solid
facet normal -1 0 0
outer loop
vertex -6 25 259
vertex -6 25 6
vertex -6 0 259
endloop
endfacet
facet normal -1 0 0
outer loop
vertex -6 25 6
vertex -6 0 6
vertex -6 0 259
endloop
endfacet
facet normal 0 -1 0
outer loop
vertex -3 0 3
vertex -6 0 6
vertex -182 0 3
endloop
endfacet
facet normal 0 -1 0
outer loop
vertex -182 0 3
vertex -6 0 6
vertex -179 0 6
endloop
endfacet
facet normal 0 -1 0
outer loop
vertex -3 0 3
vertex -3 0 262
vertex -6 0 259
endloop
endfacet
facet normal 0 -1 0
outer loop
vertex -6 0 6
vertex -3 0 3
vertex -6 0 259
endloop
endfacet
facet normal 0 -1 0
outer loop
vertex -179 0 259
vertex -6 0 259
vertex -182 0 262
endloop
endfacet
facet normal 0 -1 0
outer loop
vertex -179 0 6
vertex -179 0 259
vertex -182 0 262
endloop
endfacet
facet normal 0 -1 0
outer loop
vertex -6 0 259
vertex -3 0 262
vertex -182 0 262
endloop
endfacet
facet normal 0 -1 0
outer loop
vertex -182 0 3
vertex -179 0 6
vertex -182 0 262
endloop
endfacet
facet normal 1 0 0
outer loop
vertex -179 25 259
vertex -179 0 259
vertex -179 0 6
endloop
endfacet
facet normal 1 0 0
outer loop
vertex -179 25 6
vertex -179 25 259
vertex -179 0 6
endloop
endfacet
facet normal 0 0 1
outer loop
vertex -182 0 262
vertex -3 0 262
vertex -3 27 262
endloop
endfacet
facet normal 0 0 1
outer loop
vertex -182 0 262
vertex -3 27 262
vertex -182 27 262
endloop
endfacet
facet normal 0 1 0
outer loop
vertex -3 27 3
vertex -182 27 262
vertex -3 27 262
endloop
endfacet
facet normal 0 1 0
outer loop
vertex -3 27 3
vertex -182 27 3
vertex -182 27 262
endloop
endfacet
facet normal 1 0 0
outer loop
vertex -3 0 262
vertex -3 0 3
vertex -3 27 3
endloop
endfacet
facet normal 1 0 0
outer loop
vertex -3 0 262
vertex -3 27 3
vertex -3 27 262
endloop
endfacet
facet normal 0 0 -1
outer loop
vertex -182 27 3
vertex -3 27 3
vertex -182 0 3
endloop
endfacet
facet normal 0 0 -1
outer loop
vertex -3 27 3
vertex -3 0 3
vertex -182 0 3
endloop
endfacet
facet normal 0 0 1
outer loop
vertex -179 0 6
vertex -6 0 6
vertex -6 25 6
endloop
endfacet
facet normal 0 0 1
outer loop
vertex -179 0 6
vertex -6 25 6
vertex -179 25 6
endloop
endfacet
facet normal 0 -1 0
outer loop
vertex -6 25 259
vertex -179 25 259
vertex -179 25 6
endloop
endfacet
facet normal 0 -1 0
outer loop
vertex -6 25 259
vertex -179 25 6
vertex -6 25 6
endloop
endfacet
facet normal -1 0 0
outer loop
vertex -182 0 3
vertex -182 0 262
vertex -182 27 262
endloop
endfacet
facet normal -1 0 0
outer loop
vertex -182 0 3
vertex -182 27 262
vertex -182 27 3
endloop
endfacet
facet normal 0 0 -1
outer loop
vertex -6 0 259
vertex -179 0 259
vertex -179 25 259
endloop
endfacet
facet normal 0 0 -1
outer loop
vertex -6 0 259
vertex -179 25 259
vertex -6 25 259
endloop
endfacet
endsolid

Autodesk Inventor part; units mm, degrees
ref_plane "YZ Plane" through (0, 0, 0) normal (1, 0, 0) x (0, 1, 0)
ref_plane "XZ Plane" through (0, 0, 0) normal (0, 1, 0) x (-1, 0, 0)
ref_plane "XY Plane" through (0, 0, 0) normal (0, 0, 1) x (1, 0, 0)
sketch "Esboço1" plane through (0, 0, 0) normal (0, 1, 0) x (-1, 0, 0)
  line L0 (3, 3) -> (182, 3)
  line L1 (3, 262) -> (182, 262)
  line L2 (182, 262) -> (182, 3)
  line L3 (182, 3) -> (3, 3)
  line L4 (3, 3) -> (3, 262)
  line L5 (6, 6) -> (179, 6)
  line L6 (179, 259) -> (6, 259)
  line L7 (179, 6) -> (6, 6)
  line L8 (6, 6) -> (6, 259)
  line L9 (6, 259) -> (179, 259)
  line L10 (179, 259) -> (179, 6)
  point P0 (0, 0)
  point P1 (0, 0)
extrude "Extrusão1" add sketch "Esboço1" along normal blind 25
sketch "Esboço2" plane through (0, 25, 0) normal (0, 1, 0) x (1, 0, 0)
  line L0 (-182, -3) -> (-3, -3) projected
  line L1 (-3, -262) -> (-3, -3) projected
  line L2 (-182, -3) -> (-3, -3)
  line L3 (-3, -3) -> (-3, -262)
  line L4 (-3, -262) -> (-182, -262)
  line L5 (-182, -262) -> (-182, -3)
  point P0 (0, 0)
extrude "Extrusão2" add sketch "Esboço2" along normal blind 2
properties part number "tampa caixa" material "PCL plástico"
